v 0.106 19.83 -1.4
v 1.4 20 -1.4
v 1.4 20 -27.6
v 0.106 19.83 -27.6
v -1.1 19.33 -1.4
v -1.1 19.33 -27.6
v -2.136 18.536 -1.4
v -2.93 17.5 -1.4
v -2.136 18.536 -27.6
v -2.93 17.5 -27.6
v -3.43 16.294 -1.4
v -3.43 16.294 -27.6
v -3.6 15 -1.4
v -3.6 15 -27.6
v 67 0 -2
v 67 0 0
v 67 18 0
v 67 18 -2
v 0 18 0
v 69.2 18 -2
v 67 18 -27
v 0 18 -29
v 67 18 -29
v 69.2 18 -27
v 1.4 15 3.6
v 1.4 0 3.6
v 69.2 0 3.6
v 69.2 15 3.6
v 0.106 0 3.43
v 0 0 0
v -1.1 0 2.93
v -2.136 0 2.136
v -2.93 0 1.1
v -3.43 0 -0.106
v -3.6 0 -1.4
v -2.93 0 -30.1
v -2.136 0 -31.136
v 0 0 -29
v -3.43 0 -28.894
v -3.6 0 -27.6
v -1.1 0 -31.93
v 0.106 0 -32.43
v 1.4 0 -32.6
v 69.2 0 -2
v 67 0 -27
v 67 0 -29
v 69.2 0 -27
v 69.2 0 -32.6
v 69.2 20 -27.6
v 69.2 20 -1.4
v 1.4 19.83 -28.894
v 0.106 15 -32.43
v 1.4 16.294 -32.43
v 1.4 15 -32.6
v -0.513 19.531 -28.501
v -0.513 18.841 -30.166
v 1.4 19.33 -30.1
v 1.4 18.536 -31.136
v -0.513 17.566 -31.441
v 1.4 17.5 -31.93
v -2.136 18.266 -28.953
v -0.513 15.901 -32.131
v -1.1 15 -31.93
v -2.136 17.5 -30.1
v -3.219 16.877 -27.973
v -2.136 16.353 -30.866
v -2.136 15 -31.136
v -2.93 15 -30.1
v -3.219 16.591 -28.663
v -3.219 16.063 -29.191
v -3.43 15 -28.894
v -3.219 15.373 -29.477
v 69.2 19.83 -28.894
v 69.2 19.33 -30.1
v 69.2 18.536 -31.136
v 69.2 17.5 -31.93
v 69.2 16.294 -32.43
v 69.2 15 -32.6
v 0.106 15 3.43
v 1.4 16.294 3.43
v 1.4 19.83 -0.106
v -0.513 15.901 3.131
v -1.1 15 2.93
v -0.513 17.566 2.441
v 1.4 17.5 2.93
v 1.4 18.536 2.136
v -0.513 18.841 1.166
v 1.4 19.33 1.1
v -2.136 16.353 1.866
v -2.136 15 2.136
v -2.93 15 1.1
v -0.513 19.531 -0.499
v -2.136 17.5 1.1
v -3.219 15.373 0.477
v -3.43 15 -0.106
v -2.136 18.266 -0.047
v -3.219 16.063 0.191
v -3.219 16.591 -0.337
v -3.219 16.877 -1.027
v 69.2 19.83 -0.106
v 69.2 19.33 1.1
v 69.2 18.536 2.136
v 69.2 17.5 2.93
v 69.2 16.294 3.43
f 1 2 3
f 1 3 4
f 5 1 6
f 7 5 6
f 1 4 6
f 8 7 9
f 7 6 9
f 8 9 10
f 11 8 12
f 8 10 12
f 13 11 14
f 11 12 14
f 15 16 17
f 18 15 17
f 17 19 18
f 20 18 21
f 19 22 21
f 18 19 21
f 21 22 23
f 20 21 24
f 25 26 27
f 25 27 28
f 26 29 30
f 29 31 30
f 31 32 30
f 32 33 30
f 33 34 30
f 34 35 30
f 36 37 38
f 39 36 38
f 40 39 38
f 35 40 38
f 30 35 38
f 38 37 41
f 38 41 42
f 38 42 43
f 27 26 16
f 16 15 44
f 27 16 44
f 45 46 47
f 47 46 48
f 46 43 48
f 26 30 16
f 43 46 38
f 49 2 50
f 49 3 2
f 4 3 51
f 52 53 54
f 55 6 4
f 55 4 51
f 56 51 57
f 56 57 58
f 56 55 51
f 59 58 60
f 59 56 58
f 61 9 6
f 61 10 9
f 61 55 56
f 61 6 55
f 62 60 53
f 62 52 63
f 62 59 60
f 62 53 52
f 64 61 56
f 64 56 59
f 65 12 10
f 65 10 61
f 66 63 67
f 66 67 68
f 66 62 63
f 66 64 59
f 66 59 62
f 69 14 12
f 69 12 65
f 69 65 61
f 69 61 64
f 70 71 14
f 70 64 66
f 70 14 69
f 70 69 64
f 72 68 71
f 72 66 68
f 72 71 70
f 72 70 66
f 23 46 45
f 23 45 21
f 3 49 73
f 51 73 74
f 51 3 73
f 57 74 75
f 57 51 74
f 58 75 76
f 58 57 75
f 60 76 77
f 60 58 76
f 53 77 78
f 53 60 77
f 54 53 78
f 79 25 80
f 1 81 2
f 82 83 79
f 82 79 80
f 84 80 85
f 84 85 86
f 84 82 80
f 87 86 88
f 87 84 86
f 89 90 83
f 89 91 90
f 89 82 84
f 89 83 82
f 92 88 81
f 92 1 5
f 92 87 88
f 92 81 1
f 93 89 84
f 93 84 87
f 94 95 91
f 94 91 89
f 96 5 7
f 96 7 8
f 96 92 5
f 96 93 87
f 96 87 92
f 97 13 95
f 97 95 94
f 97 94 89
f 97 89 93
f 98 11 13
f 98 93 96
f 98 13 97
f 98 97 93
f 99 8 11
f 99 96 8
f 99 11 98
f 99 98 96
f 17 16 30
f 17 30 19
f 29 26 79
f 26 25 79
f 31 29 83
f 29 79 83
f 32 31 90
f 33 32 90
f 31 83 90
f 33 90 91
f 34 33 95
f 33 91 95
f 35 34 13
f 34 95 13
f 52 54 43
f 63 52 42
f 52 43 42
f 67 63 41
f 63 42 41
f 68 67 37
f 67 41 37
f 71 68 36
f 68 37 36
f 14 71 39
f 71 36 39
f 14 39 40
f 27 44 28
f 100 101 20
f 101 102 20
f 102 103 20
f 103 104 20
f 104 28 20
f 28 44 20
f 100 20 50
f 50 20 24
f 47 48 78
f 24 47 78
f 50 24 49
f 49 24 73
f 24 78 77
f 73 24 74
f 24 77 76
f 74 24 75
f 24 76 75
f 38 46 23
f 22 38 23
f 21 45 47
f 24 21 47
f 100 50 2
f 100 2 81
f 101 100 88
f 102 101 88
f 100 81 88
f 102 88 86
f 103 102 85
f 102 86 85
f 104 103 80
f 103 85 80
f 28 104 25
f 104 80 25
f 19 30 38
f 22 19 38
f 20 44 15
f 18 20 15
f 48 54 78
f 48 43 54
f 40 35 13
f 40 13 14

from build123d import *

# Parameters (mm, degrees)
SKETCH_1_W          = 72.2
SKETCH_1_H          = 36.2
SKETCH_1_W_2        = 65
SKETCH_1_H_2        = 29
EXTRUDE_1_DEPTH     = 20
SKETCH_2_W          = 29
SKETCH_2_H          = 20
CUT_EXTRUDE_1_DEPTH = 3.6
SKETCH_3_W          = 3.6
SKETCH_3_H          = 20
EXTRUDE_1_2_DEPTH   = 0.6
SKETCH_4_W          = 2.2
SKETCH_4_H          = 20
EXTRUDE_2_DEPTH     = 2
SKETCH_5_W          = 2.2
SKETCH_5_H          = 20
EXTRUDE_3_DEPTH     = 2
SKETCH_6_W          = 72.8
SKETCH_6_H          = 36.2
EXTRUDE_4_DEPTH     = 2
FILLET_1_R          = 5
FILLET_2_R          = 5
FILLET_3_R          = 5


with BuildPart() as part:
    # 草图1 → Extrude 1 (new body)
    with BuildSketch(Plane(origin=(0, 0, 0), x_dir=(1, 0, 0), z_dir=(0, 1, 0))):
        with Locations((32.5, 14.5)):
            Rectangle(SKETCH_1_W, SKETCH_1_H)
        with Locations((32.5, 14.5)):
            Rectangle(SKETCH_1_W_2, SKETCH_1_H_2, mode=Mode.SUBTRACT)
    extrude(amount=EXTRUDE_1_DEPTH)

    # 草图2 → 切除-拉伸1 (cut)
    with BuildSketch(Plane.ZY.offset(-65)):
        with Locations((-14.5, 10)):
            Rectangle(SKETCH_2_W, SKETCH_2_H)
    extrude(amount=-CUT_EXTRUDE_1_DEPTH, mode=Mode.SUBTRACT)

    # 草图3 → Extrude 1 2 (add)
    with BuildSketch(Plane(origin=(68.6, 0, 0), x_dir=(0, 0, -1), z_dir=(1, 0, 0))):
        with Locations((-1.8, 10)):
            Rectangle(SKETCH_3_W, SKETCH_3_H)
        with Locations((30.8, 10)):
            Rectangle(SKETCH_3_W, SKETCH_3_H)
    extrude(amount=EXTRUDE_1_2_DEPTH)

    # 草图4 → 凸台-拉伸2 (add)
    with BuildSketch(Plane(origin=(0, 0, 0), x_dir=(-1, 0, 0), z_dir=(0, 0, -1))):
        with Locations((-68.1, 10)):
            Rectangle(SKETCH_4_W, SKETCH_4_H)
    extrude(amount=EXTRUDE_2_DEPTH)

    # 草图5 → 凸台-拉伸3 (add)
    with BuildSketch(Plane.XY.offset(-29)):
        with Locations((68.1, 10)):
            Rectangle(SKETCH_5_W, SKETCH_5_H)
    extrude(amount=EXTRUDE_3_DEPTH)

    # 草图6 → 凸台-拉伸4 (add)
    with BuildSketch(Plane(origin=(0, 20, 0), x_dir=(1, 0, 0), z_dir=(0, 1, 0))):
        with Locations((32.8, 14.5)):
            Rectangle(SKETCH_6_W, SKETCH_6_H)
    extrude(amount=-EXTRUDE_4_DEPTH)

    # 圆角1
    fillet_1_edges = [part.edges().sort_by_distance(p)[0] for p in [
        (32.8, 20, -32.6),
    ]]
    fillet(fillet_1_edges, radius=FILLET_1_R)

    # 圆角2
    fillet_2_edges = [part.edges().sort_by_distance(p)[0] for p in [
        (32.8, 20, 3.6),
    ]]
    fillet(fillet_2_edges, radius=FILLET_2_R)

    # 圆角3
    fillet_3_edges = [part.edges().sort_by_distance(p)[0] for p in [
        (-3.6, 20, -14.5),
        (-3.6, 7.5, -32.6),
        (-3.6, 18.535533906, -31.135533906),
        (-3.6, 7.5, 3.6),
        (-3.6, 18.535533906, 2.135533906),
    ]]
    fillet(fillet_3_edges, radius=FILLET_3_R)


solid = part.part
